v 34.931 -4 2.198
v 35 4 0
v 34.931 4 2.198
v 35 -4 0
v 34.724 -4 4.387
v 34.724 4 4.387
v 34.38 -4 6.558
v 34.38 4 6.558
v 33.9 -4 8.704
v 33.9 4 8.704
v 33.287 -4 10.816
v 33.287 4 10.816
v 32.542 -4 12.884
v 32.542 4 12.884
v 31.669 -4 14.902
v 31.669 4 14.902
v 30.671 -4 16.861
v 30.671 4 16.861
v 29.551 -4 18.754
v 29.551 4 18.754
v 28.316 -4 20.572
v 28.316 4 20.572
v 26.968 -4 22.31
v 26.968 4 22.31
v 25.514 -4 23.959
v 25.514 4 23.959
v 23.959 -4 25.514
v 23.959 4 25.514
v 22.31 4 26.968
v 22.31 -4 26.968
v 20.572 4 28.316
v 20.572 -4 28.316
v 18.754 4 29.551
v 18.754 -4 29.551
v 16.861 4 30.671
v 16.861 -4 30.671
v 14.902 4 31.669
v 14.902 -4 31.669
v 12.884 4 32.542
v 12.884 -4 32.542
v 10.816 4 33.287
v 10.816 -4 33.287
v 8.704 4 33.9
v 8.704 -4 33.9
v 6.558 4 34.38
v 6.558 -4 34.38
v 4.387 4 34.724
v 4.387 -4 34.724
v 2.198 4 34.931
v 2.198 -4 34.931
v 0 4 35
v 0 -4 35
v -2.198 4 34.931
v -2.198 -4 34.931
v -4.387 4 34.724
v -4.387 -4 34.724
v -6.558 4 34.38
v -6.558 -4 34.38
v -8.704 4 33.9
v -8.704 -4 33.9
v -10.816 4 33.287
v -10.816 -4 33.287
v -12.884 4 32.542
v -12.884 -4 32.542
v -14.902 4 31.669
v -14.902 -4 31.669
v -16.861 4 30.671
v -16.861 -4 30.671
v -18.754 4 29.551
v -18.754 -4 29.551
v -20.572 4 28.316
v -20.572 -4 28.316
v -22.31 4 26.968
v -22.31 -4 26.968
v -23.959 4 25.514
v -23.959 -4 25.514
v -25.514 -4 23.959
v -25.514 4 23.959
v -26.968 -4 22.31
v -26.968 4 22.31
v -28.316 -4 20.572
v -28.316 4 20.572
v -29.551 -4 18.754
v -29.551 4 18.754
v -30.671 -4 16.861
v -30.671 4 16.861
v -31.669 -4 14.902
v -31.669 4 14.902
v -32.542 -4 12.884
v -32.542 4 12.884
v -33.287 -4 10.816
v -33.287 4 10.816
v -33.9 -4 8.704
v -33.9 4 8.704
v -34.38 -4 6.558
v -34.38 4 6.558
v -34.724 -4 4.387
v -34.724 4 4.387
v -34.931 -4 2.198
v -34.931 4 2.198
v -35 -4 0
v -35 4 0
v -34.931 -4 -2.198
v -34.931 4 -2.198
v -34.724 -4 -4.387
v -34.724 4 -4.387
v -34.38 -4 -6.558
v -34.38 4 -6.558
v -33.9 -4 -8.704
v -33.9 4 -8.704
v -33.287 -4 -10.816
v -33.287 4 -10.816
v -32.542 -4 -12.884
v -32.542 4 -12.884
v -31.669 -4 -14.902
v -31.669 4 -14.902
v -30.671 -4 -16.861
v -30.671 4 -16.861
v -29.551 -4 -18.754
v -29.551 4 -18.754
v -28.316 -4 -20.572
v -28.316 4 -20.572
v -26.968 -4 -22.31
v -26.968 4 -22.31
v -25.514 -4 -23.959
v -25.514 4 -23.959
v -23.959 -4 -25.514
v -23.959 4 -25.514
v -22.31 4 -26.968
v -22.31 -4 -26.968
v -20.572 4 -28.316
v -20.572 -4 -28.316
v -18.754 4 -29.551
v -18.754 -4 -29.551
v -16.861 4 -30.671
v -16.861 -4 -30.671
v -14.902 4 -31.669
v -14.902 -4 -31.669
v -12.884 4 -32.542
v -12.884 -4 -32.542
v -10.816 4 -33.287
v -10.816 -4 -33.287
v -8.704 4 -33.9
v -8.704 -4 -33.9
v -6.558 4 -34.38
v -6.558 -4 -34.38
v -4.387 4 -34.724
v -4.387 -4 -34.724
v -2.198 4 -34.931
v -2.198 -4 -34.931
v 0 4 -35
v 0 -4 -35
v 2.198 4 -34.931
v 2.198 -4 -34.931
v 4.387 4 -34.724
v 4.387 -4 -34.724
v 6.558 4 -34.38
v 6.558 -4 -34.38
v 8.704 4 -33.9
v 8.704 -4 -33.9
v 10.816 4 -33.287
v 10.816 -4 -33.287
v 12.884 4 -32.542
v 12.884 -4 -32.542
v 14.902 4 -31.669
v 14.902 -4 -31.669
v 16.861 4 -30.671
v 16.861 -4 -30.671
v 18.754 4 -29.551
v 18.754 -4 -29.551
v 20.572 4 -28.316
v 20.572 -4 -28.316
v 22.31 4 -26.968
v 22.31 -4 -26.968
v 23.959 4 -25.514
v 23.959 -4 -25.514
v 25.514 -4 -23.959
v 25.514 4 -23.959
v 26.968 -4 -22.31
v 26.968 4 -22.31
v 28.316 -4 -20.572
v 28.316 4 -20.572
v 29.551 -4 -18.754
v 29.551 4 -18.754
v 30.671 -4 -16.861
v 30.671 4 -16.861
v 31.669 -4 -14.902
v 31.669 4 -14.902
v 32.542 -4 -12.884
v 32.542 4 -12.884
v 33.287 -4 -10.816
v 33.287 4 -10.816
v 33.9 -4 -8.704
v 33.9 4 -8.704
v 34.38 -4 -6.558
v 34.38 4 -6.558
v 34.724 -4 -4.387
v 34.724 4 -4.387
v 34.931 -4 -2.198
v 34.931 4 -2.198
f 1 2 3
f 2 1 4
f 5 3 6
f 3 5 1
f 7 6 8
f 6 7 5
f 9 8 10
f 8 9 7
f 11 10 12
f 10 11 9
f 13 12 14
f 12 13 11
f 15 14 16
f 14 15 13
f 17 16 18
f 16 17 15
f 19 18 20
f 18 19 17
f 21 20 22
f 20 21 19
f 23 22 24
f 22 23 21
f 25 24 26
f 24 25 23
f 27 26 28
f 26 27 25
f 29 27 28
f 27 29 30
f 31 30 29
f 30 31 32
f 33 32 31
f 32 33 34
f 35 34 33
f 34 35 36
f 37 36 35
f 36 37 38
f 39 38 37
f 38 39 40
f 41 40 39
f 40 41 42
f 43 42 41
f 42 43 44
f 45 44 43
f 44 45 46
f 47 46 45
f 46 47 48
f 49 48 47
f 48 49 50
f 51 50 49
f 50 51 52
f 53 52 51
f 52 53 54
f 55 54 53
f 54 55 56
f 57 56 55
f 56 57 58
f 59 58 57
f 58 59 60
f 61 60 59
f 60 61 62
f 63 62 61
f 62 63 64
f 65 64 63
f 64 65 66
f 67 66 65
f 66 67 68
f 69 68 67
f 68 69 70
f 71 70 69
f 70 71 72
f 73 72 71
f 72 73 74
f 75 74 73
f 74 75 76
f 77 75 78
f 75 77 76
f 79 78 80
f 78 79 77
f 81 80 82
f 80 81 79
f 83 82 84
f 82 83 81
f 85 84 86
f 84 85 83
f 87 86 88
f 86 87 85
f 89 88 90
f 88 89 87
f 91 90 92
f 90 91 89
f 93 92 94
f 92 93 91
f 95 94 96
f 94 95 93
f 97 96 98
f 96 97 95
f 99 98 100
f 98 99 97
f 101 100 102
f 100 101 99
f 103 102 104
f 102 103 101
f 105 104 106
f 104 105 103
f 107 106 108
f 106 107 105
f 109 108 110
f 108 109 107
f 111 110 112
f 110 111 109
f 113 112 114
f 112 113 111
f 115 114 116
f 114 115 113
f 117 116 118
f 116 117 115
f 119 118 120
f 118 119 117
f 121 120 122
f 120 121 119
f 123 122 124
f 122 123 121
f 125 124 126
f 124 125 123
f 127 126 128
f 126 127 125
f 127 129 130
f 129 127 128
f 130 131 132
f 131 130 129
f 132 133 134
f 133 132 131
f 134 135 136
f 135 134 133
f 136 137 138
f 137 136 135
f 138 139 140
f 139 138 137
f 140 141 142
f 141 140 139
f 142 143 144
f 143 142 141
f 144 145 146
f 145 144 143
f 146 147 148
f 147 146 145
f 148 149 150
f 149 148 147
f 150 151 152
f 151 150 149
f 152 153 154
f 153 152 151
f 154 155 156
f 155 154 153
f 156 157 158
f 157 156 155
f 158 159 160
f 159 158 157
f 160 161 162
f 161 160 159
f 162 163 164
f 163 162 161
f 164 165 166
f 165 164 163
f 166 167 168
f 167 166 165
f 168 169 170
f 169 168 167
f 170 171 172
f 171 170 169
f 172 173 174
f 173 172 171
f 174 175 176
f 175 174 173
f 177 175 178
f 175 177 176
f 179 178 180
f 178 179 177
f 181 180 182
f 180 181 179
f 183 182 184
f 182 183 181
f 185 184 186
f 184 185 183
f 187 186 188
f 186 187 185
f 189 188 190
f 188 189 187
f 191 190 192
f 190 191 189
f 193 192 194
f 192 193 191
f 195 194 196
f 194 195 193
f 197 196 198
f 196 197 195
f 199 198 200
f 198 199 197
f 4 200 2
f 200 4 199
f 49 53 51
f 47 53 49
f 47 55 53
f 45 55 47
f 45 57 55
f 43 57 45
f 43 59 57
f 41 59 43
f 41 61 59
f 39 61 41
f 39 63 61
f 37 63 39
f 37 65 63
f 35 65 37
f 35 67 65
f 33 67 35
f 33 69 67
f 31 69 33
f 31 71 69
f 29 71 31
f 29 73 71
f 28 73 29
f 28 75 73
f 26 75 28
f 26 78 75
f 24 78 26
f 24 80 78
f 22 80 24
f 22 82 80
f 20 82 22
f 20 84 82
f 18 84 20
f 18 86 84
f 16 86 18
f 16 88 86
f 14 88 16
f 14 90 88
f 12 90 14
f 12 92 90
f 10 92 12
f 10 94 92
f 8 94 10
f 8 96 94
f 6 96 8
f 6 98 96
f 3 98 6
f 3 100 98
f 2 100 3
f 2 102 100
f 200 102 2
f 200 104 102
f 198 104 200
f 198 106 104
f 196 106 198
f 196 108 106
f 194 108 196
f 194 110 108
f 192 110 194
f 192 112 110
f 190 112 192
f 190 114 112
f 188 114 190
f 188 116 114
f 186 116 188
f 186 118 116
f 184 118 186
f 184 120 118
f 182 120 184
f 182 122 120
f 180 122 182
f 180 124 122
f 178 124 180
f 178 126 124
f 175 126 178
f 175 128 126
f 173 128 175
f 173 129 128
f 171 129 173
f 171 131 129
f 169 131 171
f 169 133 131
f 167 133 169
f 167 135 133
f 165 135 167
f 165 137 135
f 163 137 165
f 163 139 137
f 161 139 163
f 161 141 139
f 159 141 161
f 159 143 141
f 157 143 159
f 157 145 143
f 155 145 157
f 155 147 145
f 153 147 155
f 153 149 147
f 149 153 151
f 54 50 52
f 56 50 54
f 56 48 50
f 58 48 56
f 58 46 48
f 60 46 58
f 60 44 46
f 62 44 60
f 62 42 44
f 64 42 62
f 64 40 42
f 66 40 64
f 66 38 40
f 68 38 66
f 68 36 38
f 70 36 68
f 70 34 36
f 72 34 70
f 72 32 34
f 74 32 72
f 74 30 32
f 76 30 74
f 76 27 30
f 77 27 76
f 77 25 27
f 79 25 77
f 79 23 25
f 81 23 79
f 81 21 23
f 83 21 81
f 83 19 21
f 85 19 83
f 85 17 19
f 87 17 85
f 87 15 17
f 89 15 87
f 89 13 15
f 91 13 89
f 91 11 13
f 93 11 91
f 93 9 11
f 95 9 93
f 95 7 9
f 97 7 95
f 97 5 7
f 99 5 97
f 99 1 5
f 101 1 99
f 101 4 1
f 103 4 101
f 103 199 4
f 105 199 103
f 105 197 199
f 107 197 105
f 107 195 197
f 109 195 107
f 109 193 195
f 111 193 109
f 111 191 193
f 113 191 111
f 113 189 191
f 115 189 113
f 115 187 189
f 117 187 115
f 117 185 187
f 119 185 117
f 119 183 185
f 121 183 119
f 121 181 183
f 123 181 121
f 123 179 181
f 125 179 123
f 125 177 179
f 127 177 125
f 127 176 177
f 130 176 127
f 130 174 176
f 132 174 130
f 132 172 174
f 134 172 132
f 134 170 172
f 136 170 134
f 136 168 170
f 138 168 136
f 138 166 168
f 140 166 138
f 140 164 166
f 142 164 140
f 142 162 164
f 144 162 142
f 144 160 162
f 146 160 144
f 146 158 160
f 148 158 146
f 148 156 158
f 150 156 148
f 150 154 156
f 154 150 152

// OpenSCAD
// all measurements in millimeters

h = 8;
r = 35;
fn = 100;

rotate([90, 0, 0]){
    translate([0, 0, -h/2])
    cylinder(h, r=r, $fn=fn);
}
